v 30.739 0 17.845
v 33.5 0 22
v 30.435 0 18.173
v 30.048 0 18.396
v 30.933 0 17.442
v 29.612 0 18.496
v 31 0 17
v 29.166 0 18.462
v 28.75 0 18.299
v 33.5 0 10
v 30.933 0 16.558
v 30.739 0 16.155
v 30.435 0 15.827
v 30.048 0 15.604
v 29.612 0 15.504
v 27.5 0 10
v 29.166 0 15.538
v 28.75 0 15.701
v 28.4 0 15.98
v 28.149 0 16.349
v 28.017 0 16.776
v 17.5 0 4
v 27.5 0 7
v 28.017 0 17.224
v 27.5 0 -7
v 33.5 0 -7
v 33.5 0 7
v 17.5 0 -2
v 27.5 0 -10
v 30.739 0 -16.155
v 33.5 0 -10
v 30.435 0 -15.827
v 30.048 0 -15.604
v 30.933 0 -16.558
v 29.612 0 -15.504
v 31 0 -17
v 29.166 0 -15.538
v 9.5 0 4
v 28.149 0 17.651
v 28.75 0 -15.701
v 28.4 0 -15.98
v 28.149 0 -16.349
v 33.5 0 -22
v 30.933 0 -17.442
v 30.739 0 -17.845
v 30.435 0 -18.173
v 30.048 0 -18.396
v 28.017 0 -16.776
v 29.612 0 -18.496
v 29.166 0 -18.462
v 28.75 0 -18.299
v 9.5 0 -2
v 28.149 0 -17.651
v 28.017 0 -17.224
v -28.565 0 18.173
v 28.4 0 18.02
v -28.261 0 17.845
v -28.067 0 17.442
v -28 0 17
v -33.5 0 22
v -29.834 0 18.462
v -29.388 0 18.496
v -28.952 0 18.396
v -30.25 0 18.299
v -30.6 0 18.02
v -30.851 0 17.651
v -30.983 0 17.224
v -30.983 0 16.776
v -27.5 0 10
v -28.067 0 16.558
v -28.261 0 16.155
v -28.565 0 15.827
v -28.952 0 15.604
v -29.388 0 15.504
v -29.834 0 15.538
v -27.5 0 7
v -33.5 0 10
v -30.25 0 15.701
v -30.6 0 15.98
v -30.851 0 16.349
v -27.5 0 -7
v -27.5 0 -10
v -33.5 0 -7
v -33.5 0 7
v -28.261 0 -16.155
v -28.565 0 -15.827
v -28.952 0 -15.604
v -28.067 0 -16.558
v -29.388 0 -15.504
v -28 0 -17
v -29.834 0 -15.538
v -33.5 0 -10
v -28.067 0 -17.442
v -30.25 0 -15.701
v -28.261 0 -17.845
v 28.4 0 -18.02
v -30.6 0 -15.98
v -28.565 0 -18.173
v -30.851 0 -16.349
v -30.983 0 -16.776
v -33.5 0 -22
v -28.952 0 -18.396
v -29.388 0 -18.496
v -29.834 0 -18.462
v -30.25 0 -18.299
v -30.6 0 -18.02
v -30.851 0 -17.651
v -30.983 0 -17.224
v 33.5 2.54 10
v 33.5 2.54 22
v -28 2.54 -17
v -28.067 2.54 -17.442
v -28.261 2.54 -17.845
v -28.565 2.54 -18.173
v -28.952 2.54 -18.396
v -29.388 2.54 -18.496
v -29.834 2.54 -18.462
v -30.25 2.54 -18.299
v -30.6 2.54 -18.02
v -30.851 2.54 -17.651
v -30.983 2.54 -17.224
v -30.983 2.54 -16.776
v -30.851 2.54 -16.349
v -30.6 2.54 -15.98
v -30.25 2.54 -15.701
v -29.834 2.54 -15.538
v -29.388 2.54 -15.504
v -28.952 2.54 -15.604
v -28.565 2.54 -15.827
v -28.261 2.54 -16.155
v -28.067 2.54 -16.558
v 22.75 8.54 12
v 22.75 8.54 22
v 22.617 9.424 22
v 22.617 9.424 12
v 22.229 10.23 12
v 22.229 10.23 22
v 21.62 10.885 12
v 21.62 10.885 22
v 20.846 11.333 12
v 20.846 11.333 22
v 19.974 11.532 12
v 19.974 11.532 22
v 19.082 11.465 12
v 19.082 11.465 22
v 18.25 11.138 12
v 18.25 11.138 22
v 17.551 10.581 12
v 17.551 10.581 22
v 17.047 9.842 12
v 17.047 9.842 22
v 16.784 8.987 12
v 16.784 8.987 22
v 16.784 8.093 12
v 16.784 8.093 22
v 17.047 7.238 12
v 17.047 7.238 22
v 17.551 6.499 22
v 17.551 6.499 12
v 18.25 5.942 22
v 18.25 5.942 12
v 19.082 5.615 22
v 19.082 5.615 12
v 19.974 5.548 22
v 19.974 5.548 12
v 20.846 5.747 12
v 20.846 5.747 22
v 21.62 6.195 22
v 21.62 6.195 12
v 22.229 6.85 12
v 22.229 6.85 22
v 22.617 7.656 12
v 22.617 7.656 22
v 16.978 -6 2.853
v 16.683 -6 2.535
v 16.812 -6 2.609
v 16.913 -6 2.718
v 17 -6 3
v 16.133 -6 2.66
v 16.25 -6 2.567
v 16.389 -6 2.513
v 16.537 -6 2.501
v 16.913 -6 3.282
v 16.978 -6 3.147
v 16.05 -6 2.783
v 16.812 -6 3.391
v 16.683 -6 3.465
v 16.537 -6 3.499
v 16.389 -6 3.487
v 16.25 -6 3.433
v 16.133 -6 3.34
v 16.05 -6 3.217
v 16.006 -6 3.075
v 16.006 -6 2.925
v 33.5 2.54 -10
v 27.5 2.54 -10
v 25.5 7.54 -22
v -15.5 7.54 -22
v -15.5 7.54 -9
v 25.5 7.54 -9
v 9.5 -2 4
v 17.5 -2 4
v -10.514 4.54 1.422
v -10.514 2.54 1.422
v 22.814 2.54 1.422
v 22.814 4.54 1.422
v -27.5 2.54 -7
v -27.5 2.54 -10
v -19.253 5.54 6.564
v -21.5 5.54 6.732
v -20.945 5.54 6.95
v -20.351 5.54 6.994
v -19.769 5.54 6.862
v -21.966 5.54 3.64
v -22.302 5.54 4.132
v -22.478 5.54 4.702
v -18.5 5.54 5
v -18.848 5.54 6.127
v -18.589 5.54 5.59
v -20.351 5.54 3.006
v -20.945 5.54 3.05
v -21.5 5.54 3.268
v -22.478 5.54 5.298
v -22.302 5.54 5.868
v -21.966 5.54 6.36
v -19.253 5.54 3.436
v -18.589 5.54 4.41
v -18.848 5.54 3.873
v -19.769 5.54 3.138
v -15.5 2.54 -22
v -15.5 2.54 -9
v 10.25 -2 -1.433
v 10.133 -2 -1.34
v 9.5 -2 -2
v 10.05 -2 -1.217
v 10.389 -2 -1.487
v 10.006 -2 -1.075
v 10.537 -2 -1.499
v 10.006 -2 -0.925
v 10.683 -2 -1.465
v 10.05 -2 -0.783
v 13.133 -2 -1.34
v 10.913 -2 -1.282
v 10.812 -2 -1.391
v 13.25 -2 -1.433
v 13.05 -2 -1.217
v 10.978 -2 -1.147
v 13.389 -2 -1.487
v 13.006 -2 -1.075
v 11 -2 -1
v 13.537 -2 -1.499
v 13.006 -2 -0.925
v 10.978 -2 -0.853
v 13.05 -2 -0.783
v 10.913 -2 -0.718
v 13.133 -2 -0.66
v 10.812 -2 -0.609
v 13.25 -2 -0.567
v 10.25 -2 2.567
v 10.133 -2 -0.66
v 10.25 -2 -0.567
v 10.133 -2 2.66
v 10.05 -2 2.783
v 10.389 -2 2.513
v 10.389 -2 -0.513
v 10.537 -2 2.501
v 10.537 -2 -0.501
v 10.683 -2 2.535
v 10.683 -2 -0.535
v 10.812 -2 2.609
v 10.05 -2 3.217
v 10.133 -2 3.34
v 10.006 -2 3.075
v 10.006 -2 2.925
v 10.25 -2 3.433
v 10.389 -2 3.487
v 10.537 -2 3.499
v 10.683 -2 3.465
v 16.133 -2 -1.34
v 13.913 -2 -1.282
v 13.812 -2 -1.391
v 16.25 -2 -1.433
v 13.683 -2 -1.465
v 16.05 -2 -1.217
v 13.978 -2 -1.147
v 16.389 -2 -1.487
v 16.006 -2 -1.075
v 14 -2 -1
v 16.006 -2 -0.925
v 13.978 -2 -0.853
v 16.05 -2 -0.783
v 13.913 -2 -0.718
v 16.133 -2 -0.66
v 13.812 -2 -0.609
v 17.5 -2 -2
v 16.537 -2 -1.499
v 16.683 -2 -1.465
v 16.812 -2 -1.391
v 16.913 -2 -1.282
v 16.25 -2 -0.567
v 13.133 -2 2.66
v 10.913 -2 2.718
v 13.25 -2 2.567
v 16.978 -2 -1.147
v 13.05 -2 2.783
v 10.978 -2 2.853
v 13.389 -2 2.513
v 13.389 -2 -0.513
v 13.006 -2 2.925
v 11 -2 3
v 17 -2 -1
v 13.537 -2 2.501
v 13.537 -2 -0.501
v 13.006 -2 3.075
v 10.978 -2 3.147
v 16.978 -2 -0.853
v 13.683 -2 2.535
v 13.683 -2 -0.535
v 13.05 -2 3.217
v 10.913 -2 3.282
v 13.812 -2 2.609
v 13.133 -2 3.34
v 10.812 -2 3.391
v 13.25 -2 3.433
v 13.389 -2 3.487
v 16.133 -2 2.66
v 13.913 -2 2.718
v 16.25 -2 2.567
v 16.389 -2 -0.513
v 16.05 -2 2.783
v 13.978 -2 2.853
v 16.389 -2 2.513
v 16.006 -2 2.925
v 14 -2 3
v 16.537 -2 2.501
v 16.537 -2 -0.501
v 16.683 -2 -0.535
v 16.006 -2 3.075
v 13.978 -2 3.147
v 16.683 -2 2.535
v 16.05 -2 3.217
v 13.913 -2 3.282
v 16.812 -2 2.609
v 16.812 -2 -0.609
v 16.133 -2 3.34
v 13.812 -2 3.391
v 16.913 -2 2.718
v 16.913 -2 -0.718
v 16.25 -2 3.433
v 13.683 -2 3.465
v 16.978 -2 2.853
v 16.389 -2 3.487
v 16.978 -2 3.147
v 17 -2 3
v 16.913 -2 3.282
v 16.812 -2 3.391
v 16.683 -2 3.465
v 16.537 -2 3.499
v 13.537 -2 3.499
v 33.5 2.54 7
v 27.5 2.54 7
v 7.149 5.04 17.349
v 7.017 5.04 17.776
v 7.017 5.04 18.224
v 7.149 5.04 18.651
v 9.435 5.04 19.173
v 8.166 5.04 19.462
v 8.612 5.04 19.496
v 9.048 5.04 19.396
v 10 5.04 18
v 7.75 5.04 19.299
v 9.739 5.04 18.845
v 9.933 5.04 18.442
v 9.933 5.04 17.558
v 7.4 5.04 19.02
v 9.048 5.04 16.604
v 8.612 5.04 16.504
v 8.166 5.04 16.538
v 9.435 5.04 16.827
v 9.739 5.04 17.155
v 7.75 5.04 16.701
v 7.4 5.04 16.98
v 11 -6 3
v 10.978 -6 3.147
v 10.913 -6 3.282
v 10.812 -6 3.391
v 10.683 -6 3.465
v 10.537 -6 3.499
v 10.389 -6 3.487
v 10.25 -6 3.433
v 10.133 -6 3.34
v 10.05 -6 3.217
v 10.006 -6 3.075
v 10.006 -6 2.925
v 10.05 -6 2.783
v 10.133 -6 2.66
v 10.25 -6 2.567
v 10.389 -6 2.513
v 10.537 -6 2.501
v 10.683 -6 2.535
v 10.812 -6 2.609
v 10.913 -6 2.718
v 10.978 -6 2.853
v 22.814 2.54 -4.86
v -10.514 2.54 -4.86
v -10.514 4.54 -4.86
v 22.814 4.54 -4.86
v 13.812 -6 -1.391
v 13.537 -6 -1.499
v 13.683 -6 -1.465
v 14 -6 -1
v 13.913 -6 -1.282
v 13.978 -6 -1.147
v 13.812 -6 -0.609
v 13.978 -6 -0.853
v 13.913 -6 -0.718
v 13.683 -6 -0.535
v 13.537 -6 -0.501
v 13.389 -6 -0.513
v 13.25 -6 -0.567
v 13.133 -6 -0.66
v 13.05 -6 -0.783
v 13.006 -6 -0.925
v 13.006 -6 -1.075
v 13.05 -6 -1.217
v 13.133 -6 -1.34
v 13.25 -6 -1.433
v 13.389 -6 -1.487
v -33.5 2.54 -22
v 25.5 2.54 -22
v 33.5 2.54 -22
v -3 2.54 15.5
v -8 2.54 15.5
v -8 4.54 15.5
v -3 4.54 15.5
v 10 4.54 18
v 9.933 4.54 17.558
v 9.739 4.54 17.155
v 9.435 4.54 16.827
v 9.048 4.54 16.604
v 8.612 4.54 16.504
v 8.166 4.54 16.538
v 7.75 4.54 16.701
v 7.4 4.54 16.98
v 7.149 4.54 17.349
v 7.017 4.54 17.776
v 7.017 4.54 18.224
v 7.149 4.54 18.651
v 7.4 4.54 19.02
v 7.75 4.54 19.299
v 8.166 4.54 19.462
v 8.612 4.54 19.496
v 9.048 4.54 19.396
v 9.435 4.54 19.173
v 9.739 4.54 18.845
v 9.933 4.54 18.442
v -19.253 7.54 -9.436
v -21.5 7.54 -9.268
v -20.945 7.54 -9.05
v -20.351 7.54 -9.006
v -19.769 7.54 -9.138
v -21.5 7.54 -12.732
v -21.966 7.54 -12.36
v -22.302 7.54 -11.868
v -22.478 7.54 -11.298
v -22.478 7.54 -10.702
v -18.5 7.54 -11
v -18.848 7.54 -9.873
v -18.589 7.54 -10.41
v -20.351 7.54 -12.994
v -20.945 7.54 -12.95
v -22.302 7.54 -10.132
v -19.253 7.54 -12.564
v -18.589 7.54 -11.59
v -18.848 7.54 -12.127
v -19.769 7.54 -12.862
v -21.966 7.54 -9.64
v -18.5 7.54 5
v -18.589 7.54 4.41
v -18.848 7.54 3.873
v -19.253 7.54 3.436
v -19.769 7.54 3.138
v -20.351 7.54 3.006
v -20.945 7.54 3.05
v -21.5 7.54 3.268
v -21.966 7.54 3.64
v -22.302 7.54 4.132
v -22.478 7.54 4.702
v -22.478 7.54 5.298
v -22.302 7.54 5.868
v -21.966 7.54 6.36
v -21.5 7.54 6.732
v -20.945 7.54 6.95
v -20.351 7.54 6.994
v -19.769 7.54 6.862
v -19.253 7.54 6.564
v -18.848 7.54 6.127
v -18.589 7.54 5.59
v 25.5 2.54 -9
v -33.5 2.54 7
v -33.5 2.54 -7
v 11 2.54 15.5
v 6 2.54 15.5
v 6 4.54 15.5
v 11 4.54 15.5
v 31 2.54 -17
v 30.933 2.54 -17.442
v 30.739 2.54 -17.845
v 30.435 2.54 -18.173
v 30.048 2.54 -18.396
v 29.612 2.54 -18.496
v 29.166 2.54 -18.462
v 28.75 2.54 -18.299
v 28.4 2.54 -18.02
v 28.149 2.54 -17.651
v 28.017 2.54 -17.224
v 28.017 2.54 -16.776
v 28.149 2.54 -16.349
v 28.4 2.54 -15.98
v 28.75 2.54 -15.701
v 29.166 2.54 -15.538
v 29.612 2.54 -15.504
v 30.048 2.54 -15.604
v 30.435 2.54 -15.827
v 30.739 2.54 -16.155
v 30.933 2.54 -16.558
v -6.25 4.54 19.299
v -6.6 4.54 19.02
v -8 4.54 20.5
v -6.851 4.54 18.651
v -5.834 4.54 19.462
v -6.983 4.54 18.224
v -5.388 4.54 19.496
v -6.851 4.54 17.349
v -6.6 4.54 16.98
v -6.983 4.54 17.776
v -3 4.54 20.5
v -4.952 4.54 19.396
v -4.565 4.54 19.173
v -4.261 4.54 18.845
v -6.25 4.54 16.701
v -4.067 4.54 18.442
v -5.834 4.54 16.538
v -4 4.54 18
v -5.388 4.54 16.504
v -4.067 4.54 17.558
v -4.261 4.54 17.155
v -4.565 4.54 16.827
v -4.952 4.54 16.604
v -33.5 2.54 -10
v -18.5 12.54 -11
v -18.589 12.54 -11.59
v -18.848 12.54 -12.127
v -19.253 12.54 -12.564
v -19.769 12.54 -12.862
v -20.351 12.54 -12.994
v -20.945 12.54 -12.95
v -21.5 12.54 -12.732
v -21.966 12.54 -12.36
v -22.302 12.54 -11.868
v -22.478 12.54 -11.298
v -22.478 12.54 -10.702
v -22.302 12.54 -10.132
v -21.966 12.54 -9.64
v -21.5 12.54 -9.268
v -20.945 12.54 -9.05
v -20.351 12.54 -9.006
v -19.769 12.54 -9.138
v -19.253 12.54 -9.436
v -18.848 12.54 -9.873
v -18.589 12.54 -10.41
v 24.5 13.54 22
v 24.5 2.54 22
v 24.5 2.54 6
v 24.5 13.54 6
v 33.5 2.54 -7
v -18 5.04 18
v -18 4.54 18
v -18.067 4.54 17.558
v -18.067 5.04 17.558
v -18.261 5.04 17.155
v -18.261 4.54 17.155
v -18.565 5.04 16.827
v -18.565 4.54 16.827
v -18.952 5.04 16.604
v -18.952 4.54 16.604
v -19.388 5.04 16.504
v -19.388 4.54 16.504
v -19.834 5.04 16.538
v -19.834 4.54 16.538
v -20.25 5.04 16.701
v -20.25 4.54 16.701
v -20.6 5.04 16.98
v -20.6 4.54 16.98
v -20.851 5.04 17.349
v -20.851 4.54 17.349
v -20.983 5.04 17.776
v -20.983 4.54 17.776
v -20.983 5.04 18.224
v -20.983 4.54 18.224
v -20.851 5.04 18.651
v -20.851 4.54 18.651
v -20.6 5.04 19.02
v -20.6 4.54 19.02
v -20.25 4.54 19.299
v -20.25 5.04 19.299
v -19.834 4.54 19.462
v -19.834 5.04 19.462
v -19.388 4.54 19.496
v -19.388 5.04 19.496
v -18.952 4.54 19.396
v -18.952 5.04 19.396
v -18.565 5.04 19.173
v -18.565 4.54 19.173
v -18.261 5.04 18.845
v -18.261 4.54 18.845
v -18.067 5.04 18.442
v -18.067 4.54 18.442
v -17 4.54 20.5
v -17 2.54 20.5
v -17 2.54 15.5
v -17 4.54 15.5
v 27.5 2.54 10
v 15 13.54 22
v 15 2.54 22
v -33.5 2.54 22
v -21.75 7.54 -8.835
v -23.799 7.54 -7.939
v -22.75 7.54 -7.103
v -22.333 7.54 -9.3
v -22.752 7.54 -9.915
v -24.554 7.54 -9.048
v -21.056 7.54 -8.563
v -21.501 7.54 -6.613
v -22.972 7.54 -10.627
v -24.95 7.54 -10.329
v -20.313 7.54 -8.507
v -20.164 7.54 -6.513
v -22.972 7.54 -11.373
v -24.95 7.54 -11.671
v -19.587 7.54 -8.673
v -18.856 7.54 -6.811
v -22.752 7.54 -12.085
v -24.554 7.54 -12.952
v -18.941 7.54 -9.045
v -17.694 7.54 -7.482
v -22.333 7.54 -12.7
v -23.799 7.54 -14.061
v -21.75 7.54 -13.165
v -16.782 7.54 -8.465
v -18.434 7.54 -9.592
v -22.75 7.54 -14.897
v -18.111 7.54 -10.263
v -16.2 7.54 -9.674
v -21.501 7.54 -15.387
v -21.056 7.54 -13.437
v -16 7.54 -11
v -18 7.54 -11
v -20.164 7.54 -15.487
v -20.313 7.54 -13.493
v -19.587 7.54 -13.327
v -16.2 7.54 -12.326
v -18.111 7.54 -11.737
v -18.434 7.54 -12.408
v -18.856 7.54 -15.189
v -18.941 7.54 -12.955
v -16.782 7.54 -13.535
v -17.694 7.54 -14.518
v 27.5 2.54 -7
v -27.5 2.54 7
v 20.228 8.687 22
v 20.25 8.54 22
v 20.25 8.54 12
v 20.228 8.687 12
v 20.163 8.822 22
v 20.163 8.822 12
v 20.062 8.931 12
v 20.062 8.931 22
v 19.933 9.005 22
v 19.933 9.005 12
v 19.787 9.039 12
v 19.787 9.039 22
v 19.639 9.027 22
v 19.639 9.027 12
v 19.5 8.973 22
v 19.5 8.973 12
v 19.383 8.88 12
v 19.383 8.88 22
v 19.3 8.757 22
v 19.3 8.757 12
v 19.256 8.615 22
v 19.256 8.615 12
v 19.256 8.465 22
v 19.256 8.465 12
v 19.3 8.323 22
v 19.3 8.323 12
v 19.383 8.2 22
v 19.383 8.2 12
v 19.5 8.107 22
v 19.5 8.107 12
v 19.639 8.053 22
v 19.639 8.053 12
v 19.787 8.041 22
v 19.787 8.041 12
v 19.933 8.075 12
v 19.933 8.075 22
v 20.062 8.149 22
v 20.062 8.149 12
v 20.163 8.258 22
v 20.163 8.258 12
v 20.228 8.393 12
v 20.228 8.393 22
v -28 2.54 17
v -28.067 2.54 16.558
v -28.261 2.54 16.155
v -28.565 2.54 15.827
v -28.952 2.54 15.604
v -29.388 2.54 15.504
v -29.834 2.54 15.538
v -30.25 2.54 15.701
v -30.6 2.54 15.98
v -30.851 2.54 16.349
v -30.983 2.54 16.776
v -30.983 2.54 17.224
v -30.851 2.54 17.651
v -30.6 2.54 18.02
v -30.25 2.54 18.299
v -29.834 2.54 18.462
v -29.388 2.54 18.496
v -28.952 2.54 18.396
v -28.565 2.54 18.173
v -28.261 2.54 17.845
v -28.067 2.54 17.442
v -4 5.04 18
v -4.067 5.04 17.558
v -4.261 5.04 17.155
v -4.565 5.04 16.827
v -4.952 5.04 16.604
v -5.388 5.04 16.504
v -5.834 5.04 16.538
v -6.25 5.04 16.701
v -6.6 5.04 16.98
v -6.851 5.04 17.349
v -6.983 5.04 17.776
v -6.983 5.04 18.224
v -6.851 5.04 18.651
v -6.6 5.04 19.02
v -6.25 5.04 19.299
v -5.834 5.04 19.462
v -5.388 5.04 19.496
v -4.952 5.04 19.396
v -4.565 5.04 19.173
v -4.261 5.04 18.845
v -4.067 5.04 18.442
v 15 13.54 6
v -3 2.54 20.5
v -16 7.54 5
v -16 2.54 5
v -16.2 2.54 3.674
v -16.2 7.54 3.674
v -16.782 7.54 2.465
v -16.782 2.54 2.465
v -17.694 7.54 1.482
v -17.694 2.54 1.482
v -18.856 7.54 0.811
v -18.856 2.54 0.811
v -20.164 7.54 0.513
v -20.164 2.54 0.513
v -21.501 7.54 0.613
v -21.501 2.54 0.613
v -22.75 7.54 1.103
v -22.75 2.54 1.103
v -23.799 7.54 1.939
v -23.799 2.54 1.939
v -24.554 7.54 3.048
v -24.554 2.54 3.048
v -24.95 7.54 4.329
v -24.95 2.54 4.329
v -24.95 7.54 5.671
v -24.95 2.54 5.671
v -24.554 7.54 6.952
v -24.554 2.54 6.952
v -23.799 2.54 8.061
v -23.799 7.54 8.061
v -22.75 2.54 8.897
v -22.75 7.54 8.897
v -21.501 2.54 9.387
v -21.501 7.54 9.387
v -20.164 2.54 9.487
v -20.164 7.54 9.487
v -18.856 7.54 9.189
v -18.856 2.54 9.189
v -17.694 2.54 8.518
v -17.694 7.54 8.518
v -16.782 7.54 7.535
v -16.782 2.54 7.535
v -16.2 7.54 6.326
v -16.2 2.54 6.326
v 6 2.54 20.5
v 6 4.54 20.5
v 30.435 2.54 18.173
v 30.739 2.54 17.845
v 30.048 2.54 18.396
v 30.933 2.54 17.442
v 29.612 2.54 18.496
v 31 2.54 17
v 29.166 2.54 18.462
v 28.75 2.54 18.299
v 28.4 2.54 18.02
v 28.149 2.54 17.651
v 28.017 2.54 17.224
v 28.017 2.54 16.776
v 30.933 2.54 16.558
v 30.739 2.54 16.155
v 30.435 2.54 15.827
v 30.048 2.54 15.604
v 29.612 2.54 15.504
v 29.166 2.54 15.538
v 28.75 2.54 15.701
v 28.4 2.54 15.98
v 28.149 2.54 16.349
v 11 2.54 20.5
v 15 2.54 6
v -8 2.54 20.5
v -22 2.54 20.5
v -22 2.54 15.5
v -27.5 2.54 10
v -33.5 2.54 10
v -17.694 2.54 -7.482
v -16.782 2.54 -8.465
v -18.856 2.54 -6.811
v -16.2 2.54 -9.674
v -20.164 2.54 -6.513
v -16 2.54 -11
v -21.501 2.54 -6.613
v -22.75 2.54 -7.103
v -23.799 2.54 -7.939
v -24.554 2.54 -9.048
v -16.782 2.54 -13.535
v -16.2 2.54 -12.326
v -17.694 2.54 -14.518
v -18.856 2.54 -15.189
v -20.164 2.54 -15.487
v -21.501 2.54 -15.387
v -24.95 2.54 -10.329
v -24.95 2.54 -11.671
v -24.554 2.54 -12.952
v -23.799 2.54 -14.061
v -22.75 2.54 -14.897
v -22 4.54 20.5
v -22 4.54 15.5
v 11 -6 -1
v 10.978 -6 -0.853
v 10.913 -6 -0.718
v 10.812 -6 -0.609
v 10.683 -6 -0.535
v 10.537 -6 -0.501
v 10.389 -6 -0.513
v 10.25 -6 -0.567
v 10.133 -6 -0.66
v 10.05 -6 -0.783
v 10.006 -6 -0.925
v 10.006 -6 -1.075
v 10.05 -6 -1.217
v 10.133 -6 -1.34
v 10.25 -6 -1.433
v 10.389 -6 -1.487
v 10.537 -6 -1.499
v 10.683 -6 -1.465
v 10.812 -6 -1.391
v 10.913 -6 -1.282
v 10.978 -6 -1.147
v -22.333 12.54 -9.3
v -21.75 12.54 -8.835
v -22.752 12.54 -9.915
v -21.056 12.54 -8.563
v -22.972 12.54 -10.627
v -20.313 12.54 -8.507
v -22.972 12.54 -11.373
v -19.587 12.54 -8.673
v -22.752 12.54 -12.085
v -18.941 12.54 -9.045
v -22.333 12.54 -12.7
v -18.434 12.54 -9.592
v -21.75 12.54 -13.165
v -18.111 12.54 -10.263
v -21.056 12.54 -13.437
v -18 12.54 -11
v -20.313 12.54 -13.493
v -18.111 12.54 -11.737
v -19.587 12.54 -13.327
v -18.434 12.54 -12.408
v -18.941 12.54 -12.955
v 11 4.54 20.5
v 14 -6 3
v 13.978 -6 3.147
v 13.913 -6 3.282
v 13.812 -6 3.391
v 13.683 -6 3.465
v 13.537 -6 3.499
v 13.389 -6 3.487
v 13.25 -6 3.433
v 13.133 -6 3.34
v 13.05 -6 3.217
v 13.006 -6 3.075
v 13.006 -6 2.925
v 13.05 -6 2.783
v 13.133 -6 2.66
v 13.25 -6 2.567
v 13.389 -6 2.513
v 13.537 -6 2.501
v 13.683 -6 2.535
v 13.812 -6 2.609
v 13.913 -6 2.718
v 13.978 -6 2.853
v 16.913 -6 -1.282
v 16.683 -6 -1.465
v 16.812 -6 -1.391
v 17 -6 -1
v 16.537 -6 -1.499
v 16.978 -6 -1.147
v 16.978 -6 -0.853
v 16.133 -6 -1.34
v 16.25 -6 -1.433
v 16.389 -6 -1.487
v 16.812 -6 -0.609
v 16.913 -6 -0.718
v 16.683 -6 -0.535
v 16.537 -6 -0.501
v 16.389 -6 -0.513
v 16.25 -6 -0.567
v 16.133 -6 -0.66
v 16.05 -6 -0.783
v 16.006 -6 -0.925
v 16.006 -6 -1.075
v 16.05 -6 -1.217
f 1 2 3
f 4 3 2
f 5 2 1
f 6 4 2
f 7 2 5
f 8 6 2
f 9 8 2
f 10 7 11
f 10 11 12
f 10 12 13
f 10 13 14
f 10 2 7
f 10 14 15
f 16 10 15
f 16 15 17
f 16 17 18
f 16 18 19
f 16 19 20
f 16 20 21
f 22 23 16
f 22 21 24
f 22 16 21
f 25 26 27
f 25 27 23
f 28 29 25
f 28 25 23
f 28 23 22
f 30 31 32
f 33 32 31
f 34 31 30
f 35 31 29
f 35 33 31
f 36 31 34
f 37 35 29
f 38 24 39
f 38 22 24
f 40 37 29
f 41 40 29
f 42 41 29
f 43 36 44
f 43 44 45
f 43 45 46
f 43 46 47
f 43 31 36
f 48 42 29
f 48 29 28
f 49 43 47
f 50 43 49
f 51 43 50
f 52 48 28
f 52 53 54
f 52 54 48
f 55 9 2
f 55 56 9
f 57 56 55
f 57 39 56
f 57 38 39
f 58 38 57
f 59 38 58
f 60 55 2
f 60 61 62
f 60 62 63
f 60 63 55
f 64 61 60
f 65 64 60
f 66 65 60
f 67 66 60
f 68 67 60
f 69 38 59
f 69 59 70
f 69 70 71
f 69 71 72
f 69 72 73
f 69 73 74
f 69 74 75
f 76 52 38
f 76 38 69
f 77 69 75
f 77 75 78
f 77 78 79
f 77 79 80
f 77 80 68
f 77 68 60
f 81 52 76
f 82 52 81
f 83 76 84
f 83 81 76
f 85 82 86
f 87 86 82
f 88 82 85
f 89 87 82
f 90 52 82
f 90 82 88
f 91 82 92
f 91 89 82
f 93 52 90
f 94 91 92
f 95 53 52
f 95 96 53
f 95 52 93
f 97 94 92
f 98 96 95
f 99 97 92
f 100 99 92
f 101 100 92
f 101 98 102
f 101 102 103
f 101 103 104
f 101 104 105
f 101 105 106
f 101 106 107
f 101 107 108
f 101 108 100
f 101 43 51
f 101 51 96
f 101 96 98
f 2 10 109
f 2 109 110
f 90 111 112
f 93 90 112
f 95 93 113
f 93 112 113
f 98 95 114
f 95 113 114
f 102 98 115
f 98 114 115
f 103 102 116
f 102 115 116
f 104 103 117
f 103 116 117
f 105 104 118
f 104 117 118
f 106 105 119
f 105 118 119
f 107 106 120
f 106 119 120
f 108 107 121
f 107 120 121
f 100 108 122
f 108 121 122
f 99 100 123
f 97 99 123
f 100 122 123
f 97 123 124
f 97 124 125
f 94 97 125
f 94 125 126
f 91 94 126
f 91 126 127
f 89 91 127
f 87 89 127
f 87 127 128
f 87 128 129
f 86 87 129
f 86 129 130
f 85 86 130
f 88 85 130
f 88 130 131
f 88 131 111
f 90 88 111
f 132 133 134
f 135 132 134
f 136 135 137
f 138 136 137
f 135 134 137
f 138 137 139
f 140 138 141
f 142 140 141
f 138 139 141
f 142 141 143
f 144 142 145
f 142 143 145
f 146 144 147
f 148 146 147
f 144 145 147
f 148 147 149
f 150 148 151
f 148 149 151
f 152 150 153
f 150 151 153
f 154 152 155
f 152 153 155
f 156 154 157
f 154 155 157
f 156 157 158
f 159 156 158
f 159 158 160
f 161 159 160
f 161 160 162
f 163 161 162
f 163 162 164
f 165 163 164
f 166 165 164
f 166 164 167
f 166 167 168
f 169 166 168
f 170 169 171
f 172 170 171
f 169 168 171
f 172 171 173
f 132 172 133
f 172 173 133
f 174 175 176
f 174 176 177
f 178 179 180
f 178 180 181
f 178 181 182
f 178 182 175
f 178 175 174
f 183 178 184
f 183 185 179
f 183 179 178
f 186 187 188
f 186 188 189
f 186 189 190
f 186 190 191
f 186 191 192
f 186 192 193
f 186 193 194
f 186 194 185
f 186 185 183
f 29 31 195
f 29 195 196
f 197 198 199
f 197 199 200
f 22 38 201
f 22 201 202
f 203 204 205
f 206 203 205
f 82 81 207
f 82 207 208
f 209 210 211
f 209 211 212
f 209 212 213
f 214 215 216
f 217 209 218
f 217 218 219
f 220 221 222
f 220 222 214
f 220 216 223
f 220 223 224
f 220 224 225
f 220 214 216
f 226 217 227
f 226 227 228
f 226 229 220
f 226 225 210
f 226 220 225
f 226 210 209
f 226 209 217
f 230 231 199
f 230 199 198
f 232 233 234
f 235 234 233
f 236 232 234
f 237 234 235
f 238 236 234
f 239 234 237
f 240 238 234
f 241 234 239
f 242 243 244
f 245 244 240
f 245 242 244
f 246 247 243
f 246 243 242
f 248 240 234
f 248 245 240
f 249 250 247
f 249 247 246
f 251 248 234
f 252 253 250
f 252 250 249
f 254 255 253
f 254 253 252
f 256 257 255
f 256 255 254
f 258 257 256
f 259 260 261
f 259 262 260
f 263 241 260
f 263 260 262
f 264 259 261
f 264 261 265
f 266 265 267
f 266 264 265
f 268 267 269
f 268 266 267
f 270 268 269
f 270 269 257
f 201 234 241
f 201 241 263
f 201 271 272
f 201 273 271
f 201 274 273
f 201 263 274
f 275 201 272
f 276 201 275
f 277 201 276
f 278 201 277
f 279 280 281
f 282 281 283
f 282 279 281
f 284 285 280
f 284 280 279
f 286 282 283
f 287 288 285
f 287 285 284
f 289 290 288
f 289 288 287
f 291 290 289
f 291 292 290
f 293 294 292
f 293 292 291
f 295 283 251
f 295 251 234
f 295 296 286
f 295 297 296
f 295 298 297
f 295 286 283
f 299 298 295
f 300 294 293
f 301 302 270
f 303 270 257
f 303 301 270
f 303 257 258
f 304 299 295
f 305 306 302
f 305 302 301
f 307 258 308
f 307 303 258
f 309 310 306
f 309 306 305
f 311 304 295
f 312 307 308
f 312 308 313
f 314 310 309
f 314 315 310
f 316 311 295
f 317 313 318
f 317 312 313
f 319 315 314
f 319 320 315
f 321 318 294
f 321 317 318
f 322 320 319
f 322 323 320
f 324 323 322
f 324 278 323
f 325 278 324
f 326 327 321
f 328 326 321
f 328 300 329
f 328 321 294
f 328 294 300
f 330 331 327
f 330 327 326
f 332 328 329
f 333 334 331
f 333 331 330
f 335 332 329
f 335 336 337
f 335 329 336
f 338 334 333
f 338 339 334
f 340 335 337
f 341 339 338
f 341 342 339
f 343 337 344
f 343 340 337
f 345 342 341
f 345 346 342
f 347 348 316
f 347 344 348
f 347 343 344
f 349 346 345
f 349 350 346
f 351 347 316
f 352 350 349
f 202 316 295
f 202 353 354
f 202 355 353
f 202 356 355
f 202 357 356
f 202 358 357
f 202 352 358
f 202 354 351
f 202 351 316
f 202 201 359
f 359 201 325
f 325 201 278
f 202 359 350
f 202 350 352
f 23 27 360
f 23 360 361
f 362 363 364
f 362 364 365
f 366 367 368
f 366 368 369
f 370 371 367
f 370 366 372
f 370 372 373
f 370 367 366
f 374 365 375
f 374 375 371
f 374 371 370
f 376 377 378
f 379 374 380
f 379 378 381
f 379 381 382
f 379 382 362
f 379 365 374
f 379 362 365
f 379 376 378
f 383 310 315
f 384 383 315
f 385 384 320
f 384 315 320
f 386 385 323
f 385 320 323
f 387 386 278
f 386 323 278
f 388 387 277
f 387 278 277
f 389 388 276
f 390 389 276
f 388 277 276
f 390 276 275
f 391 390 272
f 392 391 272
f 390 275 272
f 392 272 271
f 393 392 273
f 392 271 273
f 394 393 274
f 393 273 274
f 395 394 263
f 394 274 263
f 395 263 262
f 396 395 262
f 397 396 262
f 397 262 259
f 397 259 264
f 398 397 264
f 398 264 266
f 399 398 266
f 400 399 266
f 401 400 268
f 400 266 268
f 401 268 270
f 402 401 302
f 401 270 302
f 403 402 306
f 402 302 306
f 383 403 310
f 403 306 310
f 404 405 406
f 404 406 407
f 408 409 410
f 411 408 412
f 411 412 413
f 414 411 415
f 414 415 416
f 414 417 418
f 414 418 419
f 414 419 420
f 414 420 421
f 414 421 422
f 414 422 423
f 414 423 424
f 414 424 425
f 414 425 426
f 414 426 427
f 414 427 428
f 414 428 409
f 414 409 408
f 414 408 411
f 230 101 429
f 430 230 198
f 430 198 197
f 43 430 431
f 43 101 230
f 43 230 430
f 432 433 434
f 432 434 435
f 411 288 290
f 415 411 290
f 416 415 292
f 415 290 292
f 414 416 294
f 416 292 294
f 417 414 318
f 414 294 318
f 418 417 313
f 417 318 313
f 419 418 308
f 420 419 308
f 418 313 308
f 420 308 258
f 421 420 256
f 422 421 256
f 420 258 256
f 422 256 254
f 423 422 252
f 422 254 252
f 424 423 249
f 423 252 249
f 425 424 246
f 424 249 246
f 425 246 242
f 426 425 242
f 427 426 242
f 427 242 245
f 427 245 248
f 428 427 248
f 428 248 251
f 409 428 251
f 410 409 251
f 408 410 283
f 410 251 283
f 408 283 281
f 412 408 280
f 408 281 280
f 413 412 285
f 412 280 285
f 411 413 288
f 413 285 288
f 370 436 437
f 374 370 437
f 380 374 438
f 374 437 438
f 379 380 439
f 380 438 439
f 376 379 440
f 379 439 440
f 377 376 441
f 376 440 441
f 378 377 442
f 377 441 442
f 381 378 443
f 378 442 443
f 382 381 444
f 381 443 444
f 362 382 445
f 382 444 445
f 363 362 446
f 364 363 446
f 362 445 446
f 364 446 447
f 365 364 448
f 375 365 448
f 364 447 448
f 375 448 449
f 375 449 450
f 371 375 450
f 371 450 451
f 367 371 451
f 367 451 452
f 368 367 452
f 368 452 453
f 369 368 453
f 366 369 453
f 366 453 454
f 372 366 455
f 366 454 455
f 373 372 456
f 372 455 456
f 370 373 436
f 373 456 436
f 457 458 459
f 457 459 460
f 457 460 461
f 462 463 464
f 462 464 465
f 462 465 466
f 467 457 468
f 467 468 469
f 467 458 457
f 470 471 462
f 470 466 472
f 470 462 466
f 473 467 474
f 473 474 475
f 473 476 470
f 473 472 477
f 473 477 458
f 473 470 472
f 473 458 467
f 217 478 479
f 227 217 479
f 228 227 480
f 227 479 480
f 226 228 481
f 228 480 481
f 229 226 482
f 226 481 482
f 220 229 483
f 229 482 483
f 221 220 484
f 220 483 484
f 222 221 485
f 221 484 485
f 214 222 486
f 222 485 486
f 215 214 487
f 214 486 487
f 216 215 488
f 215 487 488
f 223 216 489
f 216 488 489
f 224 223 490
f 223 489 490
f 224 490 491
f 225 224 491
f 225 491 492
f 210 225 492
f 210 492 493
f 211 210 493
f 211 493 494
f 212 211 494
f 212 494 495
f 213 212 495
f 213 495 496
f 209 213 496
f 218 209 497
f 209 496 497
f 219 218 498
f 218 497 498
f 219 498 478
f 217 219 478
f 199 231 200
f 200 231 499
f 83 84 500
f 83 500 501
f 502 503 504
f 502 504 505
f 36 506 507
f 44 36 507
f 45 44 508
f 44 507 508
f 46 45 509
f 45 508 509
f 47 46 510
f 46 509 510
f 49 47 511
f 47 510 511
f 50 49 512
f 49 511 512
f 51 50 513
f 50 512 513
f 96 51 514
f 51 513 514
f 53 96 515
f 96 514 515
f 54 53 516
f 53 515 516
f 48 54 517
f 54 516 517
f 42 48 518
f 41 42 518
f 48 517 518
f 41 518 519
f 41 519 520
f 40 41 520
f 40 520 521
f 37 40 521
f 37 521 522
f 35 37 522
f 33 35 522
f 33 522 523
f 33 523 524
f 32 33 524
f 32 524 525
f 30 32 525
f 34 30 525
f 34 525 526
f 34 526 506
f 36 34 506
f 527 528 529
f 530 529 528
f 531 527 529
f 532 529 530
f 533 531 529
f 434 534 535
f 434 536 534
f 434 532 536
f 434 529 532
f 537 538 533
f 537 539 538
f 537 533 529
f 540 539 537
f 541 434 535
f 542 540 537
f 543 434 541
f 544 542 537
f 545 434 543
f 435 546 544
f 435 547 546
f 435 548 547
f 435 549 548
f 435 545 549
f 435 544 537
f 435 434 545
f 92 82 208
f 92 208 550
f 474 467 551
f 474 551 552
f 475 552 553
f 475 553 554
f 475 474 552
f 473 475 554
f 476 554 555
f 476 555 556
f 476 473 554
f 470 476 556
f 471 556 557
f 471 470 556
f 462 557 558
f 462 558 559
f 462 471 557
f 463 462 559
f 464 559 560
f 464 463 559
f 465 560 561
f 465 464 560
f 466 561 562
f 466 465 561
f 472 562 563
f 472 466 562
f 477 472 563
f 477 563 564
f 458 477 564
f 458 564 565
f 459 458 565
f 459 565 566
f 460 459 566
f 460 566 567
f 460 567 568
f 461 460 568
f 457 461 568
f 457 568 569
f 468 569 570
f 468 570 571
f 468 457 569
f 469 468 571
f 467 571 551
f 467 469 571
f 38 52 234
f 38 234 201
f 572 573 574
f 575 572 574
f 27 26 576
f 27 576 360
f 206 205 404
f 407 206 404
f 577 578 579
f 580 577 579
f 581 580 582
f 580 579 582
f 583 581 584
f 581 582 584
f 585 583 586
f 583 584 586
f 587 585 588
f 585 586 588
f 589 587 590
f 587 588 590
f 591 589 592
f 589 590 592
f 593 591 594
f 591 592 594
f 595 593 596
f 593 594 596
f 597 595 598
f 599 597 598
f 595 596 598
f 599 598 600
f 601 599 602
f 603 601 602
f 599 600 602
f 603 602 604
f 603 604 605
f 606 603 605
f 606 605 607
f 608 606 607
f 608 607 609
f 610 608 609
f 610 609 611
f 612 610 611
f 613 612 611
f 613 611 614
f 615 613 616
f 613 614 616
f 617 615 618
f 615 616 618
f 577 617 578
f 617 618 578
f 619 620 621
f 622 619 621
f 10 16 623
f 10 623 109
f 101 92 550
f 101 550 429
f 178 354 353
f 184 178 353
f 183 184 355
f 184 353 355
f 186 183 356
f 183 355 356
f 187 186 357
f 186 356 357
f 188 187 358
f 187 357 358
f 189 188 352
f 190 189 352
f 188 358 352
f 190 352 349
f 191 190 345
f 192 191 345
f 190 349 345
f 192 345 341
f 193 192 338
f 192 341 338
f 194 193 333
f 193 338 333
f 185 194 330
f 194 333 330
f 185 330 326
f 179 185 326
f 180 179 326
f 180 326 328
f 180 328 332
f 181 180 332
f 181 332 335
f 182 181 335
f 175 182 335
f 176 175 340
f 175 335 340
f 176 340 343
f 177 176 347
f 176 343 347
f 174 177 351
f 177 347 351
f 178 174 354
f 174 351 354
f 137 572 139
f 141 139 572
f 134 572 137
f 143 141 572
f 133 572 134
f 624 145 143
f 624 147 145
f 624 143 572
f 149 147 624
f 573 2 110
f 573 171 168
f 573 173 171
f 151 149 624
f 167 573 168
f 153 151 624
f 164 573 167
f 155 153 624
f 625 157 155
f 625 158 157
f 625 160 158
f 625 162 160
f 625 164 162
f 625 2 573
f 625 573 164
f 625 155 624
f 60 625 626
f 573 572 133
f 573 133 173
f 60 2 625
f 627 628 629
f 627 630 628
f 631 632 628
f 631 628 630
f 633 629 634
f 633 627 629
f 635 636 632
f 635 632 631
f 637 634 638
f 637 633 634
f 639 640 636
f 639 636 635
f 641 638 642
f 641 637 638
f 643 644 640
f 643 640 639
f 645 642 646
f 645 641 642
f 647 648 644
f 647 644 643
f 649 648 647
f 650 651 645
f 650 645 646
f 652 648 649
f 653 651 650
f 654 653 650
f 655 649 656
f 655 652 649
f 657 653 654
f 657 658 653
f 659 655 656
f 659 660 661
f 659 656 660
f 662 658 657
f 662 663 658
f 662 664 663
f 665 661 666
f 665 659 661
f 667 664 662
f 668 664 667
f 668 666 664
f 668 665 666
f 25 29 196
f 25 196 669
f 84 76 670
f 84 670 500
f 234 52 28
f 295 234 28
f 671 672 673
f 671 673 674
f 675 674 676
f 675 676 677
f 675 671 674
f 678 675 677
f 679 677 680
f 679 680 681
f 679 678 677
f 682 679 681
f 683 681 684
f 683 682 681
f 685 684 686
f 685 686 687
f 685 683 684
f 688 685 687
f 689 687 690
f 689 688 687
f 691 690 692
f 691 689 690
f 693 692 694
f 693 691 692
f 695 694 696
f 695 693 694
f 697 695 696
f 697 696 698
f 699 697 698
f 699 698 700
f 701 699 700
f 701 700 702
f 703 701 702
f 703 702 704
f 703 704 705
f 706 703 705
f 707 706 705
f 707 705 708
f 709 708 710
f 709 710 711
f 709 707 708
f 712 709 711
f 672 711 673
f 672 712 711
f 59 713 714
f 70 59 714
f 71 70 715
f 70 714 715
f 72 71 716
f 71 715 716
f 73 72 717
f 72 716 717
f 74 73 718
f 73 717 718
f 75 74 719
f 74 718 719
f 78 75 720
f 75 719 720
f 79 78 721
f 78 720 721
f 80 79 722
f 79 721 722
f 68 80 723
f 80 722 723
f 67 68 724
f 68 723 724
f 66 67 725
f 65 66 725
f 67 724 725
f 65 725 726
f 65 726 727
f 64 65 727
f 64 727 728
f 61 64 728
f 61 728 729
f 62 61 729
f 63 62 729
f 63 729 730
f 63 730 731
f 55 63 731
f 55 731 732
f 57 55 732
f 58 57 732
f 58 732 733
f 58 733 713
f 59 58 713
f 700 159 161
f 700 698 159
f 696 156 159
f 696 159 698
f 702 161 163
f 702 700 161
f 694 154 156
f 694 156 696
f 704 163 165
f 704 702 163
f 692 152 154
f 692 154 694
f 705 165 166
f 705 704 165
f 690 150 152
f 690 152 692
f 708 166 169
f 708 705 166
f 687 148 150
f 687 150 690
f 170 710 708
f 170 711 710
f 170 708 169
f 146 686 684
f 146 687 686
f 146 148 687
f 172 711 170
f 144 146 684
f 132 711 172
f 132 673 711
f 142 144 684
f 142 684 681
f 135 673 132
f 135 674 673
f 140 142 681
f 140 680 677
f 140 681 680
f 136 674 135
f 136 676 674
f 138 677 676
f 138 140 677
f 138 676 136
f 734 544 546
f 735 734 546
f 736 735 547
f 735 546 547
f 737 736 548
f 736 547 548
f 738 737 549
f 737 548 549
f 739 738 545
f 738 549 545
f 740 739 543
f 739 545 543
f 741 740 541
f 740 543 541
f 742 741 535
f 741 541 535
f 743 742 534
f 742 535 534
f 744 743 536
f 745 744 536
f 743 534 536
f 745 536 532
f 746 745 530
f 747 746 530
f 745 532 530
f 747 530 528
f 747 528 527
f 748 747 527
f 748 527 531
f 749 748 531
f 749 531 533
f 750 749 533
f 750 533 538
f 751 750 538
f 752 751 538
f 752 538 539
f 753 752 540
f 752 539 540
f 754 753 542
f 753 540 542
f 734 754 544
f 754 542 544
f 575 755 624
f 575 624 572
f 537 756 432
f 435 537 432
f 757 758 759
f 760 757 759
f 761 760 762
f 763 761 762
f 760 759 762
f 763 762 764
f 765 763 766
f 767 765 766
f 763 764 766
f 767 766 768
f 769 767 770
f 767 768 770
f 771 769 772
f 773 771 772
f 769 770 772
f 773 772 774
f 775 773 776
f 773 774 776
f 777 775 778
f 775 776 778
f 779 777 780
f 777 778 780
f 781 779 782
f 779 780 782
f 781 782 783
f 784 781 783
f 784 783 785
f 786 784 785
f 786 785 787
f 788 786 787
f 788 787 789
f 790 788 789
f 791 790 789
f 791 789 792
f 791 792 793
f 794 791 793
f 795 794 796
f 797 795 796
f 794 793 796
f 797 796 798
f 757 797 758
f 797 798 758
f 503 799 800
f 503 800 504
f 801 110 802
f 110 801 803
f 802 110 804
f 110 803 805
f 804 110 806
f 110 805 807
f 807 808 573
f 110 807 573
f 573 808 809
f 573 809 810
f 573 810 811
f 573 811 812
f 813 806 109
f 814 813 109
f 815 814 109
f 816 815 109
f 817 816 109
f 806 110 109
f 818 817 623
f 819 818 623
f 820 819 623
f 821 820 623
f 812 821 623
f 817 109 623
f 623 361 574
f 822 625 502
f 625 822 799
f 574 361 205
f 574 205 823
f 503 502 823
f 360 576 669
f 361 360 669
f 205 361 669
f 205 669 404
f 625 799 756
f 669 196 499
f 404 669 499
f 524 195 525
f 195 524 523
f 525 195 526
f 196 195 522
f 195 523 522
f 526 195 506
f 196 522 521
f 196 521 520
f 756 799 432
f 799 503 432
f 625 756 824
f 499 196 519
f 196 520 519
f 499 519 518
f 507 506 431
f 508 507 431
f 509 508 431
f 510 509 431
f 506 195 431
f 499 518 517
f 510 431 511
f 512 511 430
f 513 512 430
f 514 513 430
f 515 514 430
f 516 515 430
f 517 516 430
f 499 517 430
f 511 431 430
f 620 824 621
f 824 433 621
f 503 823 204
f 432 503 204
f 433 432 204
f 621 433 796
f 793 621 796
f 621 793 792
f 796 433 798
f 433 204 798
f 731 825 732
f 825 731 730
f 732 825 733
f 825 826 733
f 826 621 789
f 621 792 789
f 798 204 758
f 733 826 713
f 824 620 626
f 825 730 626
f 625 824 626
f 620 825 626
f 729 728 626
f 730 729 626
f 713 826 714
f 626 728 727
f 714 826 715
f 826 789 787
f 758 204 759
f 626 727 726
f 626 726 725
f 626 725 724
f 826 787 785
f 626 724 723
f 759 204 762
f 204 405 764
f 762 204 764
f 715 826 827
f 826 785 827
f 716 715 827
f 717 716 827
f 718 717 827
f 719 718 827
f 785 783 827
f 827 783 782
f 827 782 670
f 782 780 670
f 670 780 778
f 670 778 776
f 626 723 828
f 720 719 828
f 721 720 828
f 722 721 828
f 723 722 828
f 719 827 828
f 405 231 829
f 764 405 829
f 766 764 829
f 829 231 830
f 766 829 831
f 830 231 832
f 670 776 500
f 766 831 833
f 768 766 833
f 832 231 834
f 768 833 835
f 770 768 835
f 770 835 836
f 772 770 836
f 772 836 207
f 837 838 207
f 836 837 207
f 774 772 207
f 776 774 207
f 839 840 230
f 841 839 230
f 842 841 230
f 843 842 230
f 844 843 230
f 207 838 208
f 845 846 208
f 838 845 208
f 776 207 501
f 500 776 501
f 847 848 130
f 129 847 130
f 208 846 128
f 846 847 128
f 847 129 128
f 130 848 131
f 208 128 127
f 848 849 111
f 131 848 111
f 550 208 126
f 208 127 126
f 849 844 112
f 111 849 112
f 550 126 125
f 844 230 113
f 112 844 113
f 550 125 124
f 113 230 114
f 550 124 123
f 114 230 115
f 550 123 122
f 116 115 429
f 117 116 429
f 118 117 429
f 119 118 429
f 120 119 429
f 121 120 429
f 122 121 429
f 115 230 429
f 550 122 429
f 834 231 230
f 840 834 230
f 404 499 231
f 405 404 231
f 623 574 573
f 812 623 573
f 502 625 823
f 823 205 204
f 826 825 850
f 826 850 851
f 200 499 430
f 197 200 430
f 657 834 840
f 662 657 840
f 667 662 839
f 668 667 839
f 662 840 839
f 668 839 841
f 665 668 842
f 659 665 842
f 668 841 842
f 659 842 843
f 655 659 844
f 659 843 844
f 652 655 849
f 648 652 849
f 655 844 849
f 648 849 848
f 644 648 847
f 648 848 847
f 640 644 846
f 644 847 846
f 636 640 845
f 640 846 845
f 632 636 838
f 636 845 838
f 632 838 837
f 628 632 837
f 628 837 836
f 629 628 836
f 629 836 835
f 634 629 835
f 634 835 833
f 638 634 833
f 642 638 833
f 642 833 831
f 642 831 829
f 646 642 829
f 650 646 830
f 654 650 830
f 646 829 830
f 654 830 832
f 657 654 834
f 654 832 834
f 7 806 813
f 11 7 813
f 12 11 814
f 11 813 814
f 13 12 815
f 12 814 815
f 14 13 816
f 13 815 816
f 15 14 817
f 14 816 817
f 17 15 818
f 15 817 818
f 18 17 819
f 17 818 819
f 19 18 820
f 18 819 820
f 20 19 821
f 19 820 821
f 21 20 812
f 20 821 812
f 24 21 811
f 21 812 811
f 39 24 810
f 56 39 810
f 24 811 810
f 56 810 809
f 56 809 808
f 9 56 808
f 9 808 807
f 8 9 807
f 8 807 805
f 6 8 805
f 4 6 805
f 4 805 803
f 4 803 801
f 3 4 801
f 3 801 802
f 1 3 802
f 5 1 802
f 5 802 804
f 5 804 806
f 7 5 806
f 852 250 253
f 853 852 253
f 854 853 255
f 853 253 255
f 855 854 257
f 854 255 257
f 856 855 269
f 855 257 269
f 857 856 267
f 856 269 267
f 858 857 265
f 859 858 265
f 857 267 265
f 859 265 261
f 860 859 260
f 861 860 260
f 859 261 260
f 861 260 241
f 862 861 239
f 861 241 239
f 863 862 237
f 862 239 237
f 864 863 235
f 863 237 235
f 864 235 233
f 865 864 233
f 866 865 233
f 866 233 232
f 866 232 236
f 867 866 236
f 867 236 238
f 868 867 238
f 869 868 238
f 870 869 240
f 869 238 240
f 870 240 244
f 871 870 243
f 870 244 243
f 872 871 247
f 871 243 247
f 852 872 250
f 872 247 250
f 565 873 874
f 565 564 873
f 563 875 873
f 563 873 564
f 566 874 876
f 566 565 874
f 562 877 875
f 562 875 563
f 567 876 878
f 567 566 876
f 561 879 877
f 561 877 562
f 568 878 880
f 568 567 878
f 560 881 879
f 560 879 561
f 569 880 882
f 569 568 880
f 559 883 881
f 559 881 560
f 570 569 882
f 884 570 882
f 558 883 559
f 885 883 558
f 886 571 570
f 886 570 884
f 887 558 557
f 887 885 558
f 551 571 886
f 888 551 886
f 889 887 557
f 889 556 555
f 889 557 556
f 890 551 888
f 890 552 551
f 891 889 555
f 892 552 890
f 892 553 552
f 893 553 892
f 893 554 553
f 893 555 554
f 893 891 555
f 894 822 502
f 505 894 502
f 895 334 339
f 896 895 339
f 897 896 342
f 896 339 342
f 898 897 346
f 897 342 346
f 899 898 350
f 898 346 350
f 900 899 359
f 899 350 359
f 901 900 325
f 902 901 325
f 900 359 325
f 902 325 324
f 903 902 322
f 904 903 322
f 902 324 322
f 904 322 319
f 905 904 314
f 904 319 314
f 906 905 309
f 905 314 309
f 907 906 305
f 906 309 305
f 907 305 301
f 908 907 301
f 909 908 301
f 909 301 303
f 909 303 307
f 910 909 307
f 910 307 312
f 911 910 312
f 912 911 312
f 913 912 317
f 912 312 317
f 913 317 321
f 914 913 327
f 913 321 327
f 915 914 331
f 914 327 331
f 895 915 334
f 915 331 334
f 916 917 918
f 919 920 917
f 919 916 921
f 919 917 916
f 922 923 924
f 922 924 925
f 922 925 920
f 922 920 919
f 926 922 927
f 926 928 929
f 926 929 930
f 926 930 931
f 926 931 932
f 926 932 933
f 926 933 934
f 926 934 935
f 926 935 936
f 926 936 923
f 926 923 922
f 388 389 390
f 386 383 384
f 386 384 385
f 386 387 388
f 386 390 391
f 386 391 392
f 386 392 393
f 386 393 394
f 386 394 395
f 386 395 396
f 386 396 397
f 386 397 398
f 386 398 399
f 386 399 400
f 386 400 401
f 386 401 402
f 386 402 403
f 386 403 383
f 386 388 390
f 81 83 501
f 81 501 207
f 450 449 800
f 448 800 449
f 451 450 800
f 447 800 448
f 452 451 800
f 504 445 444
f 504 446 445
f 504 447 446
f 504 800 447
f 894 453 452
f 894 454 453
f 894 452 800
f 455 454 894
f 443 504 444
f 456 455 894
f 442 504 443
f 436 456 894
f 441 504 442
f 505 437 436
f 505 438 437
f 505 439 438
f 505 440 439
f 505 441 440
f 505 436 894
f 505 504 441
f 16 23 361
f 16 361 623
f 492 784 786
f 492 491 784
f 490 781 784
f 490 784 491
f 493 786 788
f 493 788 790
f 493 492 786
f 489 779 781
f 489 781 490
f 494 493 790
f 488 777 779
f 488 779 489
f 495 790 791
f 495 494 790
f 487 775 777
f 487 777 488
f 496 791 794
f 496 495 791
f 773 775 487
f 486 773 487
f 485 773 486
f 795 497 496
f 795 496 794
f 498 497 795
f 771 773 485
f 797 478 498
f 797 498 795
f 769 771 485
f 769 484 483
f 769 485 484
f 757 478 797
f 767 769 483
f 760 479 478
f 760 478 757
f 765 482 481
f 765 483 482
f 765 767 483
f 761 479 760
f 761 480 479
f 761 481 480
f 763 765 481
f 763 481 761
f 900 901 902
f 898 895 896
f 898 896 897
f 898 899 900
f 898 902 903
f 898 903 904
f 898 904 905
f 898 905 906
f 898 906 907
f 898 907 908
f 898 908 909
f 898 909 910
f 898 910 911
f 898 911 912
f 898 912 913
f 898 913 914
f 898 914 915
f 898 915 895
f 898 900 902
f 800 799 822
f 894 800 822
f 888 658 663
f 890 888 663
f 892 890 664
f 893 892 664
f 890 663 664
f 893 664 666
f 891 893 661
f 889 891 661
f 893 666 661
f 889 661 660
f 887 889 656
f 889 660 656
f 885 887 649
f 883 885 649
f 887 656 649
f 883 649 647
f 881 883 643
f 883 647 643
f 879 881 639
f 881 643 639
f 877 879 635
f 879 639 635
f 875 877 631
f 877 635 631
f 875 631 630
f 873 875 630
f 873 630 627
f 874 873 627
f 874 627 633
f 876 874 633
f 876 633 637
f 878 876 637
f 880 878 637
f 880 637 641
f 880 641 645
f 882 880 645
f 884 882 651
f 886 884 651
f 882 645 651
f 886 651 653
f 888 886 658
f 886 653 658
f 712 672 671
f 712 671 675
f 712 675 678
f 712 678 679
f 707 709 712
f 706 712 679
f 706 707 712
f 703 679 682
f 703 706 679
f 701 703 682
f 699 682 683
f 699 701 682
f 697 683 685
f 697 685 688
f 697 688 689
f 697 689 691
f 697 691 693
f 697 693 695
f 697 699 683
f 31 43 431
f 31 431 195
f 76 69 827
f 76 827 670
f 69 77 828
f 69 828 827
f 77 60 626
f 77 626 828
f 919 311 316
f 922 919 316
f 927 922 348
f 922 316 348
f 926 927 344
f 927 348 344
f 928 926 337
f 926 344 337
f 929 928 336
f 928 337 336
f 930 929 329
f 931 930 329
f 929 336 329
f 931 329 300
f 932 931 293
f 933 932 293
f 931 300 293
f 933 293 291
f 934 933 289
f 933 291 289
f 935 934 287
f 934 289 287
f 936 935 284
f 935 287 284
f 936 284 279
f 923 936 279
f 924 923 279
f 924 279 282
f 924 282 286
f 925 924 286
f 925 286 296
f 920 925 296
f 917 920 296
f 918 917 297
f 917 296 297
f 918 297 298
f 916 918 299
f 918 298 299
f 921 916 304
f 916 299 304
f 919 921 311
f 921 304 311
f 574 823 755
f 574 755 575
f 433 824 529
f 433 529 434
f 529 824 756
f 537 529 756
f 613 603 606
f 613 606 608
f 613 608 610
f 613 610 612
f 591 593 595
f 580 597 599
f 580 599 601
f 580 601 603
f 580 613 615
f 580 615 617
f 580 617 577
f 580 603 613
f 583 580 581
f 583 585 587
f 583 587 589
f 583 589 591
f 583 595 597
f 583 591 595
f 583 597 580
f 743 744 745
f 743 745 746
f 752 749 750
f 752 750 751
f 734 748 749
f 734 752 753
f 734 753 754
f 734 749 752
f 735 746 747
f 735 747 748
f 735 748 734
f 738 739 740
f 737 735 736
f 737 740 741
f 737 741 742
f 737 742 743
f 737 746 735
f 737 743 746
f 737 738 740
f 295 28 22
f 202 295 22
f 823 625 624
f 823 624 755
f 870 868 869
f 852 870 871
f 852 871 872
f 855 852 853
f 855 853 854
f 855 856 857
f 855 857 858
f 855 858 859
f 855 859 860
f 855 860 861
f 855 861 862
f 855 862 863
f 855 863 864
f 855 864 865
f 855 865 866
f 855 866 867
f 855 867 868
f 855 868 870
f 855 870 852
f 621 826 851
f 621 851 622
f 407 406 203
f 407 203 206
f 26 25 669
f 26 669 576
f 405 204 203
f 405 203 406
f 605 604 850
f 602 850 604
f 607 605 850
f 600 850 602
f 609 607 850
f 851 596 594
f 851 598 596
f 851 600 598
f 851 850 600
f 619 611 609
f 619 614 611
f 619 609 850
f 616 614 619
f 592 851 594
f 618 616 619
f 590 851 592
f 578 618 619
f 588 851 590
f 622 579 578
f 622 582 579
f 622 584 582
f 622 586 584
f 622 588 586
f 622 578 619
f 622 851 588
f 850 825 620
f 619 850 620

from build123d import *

# Parameters (mm, degrees)
BOSS_EXTRUDE1_DEPTH  = 2.54
SKETCH2_R            = 1.5
CUT_EXTRUDE1_DEPTH   = 3.54
SKETCH3_R            = 4.5
BOSS_EXTRUDE2_DEPTH  = 5
SKETCH4_R            = 2.5
SKETCH4_R_2          = 2
BOSS_EXTRUDE3_DEPTH  = 5
SKETCH5_R            = 2
CUT_EXTRUDE2_DEPTH   = 2
SKETCH6_W            = 41
SKETCH6_H            = 13
BOSS_EXTRUDE4_DEPTH  = 5
SKETCH7_W            = 5
SKETCH7_H            = 5
BOSS_EXTRUDE5_DEPTH  = 2
SKETCH8_R            = 1.5
BOSS_EXTRUDE6_DEPTH  = 0.5
SKETCH9_W            = 9.5
SKETCH9_H            = 16
BOSS_EXTRUDE7_DEPTH  = 11
SKETCH10_R           = 3
SKETCH10_R_2         = 0.5
CUT_EXTRUDE3_DEPTH   = 10
SKETCH11_W           = 33.328489161
SKETCH11_H           = 6.282155695
BOSS_EXTRUDE8_DEPTH  = 2
SKETCH12_W           = 8
SKETCH12_H           = 6
BOSS_EXTRUDE9_DEPTH  = 2
SKETCH13_R           = 0.5
BOSS_EXTRUDE10_DEPTH = 4


with BuildPart() as part:
    # Sketch1 → Boss-Extrude1 (new body)
    with BuildSketch(Plane(origin=(0, 0, 0), x_dir=(1, 0, 0), z_dir=(0, 1, 0))):
        Polygon((-33.5, 10), (-33.5, 22), (33.5, 22), (33.5, 10), (27.5, 10), (27.5, 7), (33.5, 7), (33.5, -7), (27.5, -7), (27.5, -10), (33.5, -10), (33.5, -22), (-33.5, -22), (-33.5, -10), (-27.5, -10), (-27.5, -7), (-33.5, -7), (-33.5, 7), (-27.5, 7), (-27.5, 10), align=None)
    extrude(amount=BOSS_EXTRUDE1_DEPTH)

    # Sketch2 → Cut-Extrude1 (cut, through all)
    with BuildSketch(Plane(origin=(0, 2.54, 0), x_dir=(1, 0, 0), z_dir=(0, 1, 0))):
        with Locations((-29.5, -17)):
            Circle(SKETCH2_R)
        with Locations((-29.5, 17)):
            Circle(SKETCH2_R)
        with Locations((29.5, 17)):
            Circle(SKETCH2_R)
        with Locations((29.5, -17)):
            Circle(SKETCH2_R)
    extrude(amount=-CUT_EXTRUDE1_DEPTH, mode=Mode.SUBTRACT)

    # Sketch3 → Boss-Extrude2 (add)
    with BuildSketch(Plane(origin=(0, 2.54, 0), x_dir=(1, 0, 0), z_dir=(0, 1, 0))):
        with Locations((-20.5, 11)):
            Circle(SKETCH3_R)
        with Locations((-20.5, -5)):
            Circle(SKETCH3_R)
    extrude(amount=BOSS_EXTRUDE2_DEPTH)

    # Sketch4 → Boss-Extrude3 (add)
    with BuildSketch(Plane(origin=(0, 7.54, 0), x_dir=(1, 0, 0), z_dir=(0, 1, 0))):
        with Locations((-20.5, 11)):
            Circle(SKETCH4_R)
        with Locations((-20.5, 11)):
            Circle(SKETCH4_R_2, mode=Mode.SUBTRACT)
    extrude(amount=BOSS_EXTRUDE3_DEPTH)

    # Sketch5 → Cut-Extrude2 (cut)
    with BuildSketch(Plane(origin=(0, 7.54, 0), x_dir=(1, 0, 0), z_dir=(0, 1, 0))):
        with Locations((-20.5, -5)):
            Circle(SKETCH5_R)
    extrude(amount=-CUT_EXTRUDE2_DEPTH, mode=Mode.SUBTRACT)

    # Sketch6 → Boss-Extrude4 (add)
    with BuildSketch(Plane(origin=(0, 2.54, 0), x_dir=(1, 0, 0), z_dir=(0, 1, 0))):
        with Locations((5, 15.5)):
            Rectangle(SKETCH6_W, SKETCH6_H)
    extrude(amount=BOSS_EXTRUDE4_DEPTH)

    # Sketch7 → Boss-Extrude5 (add)
    with BuildSketch(Plane(origin=(0, 2.54, 0), x_dir=(1, 0, 0), z_dir=(0, 1, 0))):
        with Locations((-19.5, -18)):
            Rectangle(SKETCH7_W, SKETCH7_H)
        with Locations((-5.5, -18)):
            Rectangle(SKETCH7_W, SKETCH7_H)
        with Locations((8.5, -18)):
            Rectangle(SKETCH7_W, SKETCH7_H)
    extrude(amount=BOSS_EXTRUDE5_DEPTH)

    # Sketch8 → Boss-Extrude6 (add)
    with BuildSketch(Plane(origin=(0, 4.54, 0), x_dir=(1, 0, 0), z_dir=(0, 1, 0))):
        with Locations((-19.5, -18)):
            Circle(SKETCH8_R)
        with Locations((-5.5, -18)):
            Circle(SKETCH8_R)
        with Locations((8.5, -18)):
            Circle(SKETCH8_R)
    extrude(amount=BOSS_EXTRUDE6_DEPTH)

    # Sketch9 → Boss-Extrude7 (add)
    with BuildSketch(Plane(origin=(0, 2.54, 0), x_dir=(1, 0, 0), z_dir=(0, 1, 0))):
        with Locations((19.75, -14)):
            Rectangle(SKETCH9_W, SKETCH9_H)
    extrude(amount=BOSS_EXTRUDE7_DEPTH)

    # Sketch10 → Cut-Extrude3 (cut)
    with BuildSketch(Plane.XY.offset(22)):
        with Locations((19.75, 8.54)):
            Circle(SKETCH10_R)
        with Locations((19.75, 8.54)):
            Circle(SKETCH10_R_2, mode=Mode.SUBTRACT)
    extrude(amount=-CUT_EXTRUDE3_DEPTH, mode=Mode.SUBTRACT)

    # Sketch11 → Boss-Extrude8 (add)
    with BuildSketch(Plane(origin=(0, 2.54, 0), x_dir=(1, 0, 0), z_dir=(0, 1, 0))):
        with Locations((6.149899785, 1.719326822)):
            Rectangle(SKETCH11_W, SKETCH11_H)
    extrude(amount=BOSS_EXTRUDE8_DEPTH)

    # Sketch12 → Boss-Extrude9 (add)
    with BuildSketch(Plane.XZ):
        with Locations((13.5, 1)):
            Rectangle(SKETCH12_W, SKETCH12_H)
    extrude(amount=BOSS_EXTRUDE9_DEPTH)

    # Sketch13 → Boss-Extrude10 (add)
    with BuildSketch(Plane.XZ.offset(2)):
        with Locations((10.5, 3)):
            Circle(SKETCH13_R)
        with Locations((13.5, 3)):
            Circle(SKETCH13_R)
        with Locations((16.5, 3)):
            Circle(SKETCH13_R)
        with Locations((16.5, -1)):
            Circle(SKETCH13_R)
        with Locations((13.5, -1)):
            Circle(SKETCH13_R)
        with Locations((10.5, -1)):
            Circle(SKETCH13_R)
    extrude(amount=BOSS_EXTRUDE10_DEPTH)


solid = part.part
